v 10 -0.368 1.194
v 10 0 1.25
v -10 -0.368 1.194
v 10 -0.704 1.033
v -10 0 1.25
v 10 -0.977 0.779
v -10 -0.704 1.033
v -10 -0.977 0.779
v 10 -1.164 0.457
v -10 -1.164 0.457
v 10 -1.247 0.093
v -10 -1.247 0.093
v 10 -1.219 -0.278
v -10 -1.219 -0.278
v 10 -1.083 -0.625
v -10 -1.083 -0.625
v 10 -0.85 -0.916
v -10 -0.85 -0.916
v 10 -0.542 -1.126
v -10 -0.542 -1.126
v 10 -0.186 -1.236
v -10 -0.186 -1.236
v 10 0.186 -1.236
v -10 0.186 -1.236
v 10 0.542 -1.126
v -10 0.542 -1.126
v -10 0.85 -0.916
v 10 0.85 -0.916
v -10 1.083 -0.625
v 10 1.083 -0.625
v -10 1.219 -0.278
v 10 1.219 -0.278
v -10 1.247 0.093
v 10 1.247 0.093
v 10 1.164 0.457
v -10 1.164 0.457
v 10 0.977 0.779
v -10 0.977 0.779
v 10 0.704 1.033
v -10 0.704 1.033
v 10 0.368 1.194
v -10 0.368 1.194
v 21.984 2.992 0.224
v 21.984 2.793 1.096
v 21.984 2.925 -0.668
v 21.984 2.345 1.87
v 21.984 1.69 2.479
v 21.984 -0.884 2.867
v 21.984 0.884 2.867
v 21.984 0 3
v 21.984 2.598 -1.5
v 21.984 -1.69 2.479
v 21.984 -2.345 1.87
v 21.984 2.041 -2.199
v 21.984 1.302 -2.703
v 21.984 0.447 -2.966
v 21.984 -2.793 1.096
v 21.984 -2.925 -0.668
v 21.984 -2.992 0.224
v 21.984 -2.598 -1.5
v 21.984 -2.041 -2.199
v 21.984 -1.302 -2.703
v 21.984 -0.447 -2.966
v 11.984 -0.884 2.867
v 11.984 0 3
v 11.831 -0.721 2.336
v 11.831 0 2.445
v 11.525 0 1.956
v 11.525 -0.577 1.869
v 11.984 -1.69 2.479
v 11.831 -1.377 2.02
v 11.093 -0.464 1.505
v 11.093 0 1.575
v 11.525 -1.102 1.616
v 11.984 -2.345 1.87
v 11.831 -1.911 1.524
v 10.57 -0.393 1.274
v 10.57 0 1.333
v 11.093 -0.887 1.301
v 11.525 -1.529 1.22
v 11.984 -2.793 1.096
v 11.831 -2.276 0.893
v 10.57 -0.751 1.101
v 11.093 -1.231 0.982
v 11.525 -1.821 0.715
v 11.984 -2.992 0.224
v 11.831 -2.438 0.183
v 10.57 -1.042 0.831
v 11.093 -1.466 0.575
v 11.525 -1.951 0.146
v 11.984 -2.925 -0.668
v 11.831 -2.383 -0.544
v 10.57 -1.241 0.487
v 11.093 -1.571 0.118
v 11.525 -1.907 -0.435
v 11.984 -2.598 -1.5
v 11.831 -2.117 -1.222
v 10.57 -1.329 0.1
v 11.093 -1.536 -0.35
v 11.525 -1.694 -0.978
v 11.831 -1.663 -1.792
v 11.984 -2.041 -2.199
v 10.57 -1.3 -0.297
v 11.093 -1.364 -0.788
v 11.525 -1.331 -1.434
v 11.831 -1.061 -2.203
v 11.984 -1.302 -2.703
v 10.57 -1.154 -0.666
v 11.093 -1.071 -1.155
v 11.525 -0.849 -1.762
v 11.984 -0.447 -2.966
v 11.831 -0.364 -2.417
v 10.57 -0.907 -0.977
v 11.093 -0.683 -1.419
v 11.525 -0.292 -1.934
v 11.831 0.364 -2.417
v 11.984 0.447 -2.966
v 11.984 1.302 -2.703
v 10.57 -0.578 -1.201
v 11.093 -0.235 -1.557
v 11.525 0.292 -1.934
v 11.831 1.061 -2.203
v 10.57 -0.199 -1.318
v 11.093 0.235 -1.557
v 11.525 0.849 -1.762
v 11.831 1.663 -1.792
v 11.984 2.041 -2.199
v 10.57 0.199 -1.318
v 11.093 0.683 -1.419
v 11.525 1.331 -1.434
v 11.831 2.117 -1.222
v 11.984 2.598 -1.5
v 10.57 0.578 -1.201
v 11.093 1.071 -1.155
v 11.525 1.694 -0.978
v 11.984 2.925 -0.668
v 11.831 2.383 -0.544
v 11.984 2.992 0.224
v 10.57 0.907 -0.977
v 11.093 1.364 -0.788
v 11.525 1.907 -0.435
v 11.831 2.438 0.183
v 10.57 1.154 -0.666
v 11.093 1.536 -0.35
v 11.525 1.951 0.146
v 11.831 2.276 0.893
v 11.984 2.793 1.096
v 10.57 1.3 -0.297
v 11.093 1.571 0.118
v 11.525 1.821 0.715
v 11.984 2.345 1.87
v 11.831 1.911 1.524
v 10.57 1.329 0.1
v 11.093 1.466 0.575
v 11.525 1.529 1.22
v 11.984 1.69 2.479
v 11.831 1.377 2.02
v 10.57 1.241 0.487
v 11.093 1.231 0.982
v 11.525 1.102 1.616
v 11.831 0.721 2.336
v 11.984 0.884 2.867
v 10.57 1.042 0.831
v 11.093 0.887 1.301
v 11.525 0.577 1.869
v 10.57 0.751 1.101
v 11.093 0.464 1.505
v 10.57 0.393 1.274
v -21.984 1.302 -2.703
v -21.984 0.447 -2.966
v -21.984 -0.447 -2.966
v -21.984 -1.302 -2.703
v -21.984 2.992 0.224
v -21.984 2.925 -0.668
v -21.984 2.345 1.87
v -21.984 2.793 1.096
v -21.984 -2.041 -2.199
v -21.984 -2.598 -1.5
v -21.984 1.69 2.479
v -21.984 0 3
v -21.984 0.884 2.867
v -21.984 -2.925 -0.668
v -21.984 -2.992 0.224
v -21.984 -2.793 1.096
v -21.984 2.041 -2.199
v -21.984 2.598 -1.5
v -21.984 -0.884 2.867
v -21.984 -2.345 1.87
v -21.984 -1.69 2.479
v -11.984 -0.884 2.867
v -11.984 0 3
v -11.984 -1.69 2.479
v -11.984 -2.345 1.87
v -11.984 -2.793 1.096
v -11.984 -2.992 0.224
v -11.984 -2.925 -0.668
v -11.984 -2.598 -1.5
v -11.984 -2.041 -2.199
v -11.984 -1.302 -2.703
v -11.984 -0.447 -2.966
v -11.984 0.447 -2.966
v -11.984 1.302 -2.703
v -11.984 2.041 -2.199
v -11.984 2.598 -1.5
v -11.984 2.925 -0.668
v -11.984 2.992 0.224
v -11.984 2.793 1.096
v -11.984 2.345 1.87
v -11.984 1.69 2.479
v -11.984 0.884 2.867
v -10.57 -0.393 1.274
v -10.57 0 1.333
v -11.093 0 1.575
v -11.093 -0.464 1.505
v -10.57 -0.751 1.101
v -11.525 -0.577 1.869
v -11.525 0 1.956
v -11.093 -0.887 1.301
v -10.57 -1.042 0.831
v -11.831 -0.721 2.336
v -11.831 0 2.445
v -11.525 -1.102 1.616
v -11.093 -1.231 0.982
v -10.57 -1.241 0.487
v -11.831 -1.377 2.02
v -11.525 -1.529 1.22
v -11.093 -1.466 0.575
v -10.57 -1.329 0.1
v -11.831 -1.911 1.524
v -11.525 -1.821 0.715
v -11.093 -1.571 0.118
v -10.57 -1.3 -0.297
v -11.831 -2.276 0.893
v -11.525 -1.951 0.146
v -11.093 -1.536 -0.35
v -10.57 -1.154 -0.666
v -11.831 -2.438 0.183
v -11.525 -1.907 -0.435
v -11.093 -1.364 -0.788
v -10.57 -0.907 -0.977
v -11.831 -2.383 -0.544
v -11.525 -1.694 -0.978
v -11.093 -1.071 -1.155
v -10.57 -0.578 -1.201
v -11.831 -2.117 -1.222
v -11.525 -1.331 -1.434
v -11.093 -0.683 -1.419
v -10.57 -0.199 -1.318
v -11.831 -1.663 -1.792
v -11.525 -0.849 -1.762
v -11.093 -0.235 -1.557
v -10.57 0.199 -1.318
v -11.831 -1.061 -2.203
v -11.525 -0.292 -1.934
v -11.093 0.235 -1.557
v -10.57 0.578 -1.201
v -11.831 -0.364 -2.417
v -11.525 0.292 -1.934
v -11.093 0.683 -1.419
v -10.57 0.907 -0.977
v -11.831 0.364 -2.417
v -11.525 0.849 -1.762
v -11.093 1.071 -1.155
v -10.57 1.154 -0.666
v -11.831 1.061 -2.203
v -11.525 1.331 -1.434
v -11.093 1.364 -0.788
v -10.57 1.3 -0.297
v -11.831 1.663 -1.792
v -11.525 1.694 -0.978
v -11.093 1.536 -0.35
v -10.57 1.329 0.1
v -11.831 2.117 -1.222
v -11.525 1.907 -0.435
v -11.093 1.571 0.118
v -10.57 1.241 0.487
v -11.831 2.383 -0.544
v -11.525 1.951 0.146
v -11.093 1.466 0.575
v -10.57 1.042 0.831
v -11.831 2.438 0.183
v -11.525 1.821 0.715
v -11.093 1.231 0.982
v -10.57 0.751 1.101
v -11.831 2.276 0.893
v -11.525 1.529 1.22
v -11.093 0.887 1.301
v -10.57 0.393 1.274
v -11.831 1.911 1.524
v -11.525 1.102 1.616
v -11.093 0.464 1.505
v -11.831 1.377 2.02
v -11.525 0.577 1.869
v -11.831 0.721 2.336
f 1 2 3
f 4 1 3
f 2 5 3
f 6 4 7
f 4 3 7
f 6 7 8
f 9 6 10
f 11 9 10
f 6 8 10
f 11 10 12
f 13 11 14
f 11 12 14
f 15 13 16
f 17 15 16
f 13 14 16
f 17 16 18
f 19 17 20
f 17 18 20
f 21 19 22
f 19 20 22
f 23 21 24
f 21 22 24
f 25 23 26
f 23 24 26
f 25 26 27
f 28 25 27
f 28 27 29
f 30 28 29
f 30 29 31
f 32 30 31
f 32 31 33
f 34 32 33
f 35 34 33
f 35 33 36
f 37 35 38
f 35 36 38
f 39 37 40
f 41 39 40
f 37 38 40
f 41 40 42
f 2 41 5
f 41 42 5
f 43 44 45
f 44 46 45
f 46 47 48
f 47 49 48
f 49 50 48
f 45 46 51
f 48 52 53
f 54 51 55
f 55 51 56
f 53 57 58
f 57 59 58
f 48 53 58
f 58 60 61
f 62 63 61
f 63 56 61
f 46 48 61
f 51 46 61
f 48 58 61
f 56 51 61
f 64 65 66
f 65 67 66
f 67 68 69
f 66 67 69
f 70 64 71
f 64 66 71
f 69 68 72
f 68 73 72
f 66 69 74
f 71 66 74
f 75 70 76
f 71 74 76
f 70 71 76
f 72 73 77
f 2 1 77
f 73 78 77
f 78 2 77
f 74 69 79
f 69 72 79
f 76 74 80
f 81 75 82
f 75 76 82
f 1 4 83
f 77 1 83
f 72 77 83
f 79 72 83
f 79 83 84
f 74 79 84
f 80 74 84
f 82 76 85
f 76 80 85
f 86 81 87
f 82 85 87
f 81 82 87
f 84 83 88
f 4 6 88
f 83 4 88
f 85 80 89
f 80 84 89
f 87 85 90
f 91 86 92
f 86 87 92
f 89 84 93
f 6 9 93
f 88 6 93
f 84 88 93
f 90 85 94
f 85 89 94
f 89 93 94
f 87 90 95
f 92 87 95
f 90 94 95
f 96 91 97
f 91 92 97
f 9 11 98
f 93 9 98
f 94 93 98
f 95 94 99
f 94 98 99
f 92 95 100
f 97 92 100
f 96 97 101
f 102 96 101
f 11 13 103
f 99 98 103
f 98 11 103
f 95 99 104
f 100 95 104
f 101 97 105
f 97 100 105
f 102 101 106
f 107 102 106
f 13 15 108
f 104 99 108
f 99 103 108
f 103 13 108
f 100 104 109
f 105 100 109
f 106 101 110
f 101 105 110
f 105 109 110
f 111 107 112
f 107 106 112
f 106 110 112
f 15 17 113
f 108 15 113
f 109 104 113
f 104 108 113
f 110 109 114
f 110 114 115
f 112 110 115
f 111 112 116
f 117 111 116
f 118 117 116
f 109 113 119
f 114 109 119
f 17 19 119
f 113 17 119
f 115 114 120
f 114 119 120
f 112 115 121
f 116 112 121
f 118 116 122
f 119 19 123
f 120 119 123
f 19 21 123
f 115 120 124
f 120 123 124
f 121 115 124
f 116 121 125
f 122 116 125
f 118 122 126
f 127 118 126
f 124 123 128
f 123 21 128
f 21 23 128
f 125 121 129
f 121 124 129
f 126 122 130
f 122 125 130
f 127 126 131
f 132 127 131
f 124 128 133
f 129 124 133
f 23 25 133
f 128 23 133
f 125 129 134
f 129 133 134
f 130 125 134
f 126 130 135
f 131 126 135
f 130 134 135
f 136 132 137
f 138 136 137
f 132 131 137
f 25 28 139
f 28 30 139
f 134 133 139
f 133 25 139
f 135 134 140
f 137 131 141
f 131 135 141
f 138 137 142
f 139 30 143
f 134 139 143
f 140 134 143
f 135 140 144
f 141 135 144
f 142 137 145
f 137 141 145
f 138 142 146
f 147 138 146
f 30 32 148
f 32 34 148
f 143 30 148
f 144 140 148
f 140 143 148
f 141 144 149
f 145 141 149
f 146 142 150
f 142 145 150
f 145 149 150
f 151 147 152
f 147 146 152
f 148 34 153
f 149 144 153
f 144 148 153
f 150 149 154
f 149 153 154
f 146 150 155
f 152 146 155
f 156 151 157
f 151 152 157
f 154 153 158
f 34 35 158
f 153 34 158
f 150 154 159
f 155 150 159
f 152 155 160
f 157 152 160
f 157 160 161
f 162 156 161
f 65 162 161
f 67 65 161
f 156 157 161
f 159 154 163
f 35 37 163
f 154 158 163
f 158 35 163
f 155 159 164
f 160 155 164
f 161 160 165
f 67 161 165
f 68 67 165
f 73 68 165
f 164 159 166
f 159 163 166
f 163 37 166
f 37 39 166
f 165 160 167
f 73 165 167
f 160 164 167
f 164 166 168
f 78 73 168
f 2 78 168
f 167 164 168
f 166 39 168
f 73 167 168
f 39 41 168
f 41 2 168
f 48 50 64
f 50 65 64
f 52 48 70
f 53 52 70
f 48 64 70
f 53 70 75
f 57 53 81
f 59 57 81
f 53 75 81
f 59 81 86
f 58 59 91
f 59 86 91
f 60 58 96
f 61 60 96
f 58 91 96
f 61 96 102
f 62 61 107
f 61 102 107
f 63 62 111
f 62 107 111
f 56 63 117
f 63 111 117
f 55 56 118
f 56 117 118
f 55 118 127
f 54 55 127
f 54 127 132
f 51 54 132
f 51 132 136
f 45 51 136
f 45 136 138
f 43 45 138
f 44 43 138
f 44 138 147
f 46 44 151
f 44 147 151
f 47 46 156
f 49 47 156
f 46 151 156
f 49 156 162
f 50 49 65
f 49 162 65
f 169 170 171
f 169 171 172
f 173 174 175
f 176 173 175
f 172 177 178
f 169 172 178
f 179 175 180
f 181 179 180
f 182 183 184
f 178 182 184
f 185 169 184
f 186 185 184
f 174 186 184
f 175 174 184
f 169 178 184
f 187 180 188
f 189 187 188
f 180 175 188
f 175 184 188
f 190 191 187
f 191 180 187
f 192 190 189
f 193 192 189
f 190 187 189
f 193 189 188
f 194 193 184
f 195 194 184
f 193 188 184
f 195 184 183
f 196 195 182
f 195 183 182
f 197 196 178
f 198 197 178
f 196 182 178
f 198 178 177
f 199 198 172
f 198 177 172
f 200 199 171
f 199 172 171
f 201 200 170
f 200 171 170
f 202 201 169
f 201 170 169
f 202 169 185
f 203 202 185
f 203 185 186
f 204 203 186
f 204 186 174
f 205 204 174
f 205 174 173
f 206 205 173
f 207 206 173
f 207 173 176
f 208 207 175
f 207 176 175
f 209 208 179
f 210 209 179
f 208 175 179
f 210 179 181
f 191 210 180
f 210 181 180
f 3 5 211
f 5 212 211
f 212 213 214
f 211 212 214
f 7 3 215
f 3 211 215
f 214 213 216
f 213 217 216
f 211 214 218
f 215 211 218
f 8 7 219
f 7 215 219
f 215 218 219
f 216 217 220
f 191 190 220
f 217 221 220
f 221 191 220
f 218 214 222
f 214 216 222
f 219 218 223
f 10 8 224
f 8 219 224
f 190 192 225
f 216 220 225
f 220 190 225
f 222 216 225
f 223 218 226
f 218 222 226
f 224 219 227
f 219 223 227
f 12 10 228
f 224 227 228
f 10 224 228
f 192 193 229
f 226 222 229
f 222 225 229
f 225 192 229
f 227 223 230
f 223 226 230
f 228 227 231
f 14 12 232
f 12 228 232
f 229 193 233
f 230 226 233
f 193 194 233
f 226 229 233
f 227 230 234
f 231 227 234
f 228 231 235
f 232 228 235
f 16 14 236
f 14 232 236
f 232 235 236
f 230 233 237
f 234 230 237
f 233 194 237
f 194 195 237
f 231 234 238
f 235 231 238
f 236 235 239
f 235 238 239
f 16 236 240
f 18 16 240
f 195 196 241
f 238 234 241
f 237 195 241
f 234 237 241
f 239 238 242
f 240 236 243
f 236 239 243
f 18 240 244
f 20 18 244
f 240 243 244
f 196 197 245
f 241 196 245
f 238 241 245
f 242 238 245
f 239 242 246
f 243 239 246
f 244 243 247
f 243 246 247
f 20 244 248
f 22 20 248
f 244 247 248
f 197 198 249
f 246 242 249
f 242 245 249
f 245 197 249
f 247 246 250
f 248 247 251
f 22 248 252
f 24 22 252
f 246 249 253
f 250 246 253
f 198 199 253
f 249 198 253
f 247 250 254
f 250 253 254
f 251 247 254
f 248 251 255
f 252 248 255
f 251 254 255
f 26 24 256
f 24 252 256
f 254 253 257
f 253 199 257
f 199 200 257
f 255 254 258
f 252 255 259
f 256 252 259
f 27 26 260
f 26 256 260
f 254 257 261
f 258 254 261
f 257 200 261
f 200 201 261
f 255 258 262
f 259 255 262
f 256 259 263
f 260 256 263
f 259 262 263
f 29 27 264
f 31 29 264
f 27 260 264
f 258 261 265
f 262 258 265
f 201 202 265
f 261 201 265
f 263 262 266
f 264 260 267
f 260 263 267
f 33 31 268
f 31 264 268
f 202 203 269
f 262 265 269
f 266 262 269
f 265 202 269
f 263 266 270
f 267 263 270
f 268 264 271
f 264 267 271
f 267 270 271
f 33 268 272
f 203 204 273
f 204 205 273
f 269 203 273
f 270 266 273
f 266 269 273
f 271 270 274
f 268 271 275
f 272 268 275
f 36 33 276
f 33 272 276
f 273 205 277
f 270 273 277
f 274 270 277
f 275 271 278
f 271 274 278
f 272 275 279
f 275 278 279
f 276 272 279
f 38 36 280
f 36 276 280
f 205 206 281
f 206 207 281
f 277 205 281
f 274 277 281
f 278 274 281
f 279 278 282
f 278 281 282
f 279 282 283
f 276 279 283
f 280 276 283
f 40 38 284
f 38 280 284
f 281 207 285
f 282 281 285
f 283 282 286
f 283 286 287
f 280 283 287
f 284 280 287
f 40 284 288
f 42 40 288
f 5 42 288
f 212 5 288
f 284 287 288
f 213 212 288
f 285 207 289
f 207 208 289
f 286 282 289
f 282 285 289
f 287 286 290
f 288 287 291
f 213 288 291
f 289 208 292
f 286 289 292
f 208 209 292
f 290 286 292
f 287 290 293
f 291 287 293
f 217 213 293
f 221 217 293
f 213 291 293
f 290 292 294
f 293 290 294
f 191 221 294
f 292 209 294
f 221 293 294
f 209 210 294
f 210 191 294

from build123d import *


with BuildPart() as f1:
    # F0 (on Front) → F1 (revolve)
    with BuildSketch(Plane.XZ):
        with BuildLine():
            Line((-21.984313, 0), (0, 0))
            Line((0, 0), (0, 1.25))
            Line((0, 1.25), (-10, 1.25))
            ThreePointArc((-10, 1.25), (-11.322876, 1.75), (-11.984313, 3))
            Line((-11.984313, 3), (-21.984313, 3))
            Line((-21.984313, 3), (-21.984313, 0))
        make_face()
        with BuildLine():
            Line((0, 1.25), (0, 0))
            Line((0, 0), (21.984313, 0))
            Line((21.984313, 0), (21.984313, 3))
            Line((21.984313, 3), (11.984313, 3))
            ThreePointArc((11.984313, 3), (11.322876, 1.75), (10, 1.25))
            Line((10, 1.25), (0, 1.25))
        make_face()
    revolve(axis=Axis((0, 0, 0), (1, 0, 0)))


solid = f1.part
